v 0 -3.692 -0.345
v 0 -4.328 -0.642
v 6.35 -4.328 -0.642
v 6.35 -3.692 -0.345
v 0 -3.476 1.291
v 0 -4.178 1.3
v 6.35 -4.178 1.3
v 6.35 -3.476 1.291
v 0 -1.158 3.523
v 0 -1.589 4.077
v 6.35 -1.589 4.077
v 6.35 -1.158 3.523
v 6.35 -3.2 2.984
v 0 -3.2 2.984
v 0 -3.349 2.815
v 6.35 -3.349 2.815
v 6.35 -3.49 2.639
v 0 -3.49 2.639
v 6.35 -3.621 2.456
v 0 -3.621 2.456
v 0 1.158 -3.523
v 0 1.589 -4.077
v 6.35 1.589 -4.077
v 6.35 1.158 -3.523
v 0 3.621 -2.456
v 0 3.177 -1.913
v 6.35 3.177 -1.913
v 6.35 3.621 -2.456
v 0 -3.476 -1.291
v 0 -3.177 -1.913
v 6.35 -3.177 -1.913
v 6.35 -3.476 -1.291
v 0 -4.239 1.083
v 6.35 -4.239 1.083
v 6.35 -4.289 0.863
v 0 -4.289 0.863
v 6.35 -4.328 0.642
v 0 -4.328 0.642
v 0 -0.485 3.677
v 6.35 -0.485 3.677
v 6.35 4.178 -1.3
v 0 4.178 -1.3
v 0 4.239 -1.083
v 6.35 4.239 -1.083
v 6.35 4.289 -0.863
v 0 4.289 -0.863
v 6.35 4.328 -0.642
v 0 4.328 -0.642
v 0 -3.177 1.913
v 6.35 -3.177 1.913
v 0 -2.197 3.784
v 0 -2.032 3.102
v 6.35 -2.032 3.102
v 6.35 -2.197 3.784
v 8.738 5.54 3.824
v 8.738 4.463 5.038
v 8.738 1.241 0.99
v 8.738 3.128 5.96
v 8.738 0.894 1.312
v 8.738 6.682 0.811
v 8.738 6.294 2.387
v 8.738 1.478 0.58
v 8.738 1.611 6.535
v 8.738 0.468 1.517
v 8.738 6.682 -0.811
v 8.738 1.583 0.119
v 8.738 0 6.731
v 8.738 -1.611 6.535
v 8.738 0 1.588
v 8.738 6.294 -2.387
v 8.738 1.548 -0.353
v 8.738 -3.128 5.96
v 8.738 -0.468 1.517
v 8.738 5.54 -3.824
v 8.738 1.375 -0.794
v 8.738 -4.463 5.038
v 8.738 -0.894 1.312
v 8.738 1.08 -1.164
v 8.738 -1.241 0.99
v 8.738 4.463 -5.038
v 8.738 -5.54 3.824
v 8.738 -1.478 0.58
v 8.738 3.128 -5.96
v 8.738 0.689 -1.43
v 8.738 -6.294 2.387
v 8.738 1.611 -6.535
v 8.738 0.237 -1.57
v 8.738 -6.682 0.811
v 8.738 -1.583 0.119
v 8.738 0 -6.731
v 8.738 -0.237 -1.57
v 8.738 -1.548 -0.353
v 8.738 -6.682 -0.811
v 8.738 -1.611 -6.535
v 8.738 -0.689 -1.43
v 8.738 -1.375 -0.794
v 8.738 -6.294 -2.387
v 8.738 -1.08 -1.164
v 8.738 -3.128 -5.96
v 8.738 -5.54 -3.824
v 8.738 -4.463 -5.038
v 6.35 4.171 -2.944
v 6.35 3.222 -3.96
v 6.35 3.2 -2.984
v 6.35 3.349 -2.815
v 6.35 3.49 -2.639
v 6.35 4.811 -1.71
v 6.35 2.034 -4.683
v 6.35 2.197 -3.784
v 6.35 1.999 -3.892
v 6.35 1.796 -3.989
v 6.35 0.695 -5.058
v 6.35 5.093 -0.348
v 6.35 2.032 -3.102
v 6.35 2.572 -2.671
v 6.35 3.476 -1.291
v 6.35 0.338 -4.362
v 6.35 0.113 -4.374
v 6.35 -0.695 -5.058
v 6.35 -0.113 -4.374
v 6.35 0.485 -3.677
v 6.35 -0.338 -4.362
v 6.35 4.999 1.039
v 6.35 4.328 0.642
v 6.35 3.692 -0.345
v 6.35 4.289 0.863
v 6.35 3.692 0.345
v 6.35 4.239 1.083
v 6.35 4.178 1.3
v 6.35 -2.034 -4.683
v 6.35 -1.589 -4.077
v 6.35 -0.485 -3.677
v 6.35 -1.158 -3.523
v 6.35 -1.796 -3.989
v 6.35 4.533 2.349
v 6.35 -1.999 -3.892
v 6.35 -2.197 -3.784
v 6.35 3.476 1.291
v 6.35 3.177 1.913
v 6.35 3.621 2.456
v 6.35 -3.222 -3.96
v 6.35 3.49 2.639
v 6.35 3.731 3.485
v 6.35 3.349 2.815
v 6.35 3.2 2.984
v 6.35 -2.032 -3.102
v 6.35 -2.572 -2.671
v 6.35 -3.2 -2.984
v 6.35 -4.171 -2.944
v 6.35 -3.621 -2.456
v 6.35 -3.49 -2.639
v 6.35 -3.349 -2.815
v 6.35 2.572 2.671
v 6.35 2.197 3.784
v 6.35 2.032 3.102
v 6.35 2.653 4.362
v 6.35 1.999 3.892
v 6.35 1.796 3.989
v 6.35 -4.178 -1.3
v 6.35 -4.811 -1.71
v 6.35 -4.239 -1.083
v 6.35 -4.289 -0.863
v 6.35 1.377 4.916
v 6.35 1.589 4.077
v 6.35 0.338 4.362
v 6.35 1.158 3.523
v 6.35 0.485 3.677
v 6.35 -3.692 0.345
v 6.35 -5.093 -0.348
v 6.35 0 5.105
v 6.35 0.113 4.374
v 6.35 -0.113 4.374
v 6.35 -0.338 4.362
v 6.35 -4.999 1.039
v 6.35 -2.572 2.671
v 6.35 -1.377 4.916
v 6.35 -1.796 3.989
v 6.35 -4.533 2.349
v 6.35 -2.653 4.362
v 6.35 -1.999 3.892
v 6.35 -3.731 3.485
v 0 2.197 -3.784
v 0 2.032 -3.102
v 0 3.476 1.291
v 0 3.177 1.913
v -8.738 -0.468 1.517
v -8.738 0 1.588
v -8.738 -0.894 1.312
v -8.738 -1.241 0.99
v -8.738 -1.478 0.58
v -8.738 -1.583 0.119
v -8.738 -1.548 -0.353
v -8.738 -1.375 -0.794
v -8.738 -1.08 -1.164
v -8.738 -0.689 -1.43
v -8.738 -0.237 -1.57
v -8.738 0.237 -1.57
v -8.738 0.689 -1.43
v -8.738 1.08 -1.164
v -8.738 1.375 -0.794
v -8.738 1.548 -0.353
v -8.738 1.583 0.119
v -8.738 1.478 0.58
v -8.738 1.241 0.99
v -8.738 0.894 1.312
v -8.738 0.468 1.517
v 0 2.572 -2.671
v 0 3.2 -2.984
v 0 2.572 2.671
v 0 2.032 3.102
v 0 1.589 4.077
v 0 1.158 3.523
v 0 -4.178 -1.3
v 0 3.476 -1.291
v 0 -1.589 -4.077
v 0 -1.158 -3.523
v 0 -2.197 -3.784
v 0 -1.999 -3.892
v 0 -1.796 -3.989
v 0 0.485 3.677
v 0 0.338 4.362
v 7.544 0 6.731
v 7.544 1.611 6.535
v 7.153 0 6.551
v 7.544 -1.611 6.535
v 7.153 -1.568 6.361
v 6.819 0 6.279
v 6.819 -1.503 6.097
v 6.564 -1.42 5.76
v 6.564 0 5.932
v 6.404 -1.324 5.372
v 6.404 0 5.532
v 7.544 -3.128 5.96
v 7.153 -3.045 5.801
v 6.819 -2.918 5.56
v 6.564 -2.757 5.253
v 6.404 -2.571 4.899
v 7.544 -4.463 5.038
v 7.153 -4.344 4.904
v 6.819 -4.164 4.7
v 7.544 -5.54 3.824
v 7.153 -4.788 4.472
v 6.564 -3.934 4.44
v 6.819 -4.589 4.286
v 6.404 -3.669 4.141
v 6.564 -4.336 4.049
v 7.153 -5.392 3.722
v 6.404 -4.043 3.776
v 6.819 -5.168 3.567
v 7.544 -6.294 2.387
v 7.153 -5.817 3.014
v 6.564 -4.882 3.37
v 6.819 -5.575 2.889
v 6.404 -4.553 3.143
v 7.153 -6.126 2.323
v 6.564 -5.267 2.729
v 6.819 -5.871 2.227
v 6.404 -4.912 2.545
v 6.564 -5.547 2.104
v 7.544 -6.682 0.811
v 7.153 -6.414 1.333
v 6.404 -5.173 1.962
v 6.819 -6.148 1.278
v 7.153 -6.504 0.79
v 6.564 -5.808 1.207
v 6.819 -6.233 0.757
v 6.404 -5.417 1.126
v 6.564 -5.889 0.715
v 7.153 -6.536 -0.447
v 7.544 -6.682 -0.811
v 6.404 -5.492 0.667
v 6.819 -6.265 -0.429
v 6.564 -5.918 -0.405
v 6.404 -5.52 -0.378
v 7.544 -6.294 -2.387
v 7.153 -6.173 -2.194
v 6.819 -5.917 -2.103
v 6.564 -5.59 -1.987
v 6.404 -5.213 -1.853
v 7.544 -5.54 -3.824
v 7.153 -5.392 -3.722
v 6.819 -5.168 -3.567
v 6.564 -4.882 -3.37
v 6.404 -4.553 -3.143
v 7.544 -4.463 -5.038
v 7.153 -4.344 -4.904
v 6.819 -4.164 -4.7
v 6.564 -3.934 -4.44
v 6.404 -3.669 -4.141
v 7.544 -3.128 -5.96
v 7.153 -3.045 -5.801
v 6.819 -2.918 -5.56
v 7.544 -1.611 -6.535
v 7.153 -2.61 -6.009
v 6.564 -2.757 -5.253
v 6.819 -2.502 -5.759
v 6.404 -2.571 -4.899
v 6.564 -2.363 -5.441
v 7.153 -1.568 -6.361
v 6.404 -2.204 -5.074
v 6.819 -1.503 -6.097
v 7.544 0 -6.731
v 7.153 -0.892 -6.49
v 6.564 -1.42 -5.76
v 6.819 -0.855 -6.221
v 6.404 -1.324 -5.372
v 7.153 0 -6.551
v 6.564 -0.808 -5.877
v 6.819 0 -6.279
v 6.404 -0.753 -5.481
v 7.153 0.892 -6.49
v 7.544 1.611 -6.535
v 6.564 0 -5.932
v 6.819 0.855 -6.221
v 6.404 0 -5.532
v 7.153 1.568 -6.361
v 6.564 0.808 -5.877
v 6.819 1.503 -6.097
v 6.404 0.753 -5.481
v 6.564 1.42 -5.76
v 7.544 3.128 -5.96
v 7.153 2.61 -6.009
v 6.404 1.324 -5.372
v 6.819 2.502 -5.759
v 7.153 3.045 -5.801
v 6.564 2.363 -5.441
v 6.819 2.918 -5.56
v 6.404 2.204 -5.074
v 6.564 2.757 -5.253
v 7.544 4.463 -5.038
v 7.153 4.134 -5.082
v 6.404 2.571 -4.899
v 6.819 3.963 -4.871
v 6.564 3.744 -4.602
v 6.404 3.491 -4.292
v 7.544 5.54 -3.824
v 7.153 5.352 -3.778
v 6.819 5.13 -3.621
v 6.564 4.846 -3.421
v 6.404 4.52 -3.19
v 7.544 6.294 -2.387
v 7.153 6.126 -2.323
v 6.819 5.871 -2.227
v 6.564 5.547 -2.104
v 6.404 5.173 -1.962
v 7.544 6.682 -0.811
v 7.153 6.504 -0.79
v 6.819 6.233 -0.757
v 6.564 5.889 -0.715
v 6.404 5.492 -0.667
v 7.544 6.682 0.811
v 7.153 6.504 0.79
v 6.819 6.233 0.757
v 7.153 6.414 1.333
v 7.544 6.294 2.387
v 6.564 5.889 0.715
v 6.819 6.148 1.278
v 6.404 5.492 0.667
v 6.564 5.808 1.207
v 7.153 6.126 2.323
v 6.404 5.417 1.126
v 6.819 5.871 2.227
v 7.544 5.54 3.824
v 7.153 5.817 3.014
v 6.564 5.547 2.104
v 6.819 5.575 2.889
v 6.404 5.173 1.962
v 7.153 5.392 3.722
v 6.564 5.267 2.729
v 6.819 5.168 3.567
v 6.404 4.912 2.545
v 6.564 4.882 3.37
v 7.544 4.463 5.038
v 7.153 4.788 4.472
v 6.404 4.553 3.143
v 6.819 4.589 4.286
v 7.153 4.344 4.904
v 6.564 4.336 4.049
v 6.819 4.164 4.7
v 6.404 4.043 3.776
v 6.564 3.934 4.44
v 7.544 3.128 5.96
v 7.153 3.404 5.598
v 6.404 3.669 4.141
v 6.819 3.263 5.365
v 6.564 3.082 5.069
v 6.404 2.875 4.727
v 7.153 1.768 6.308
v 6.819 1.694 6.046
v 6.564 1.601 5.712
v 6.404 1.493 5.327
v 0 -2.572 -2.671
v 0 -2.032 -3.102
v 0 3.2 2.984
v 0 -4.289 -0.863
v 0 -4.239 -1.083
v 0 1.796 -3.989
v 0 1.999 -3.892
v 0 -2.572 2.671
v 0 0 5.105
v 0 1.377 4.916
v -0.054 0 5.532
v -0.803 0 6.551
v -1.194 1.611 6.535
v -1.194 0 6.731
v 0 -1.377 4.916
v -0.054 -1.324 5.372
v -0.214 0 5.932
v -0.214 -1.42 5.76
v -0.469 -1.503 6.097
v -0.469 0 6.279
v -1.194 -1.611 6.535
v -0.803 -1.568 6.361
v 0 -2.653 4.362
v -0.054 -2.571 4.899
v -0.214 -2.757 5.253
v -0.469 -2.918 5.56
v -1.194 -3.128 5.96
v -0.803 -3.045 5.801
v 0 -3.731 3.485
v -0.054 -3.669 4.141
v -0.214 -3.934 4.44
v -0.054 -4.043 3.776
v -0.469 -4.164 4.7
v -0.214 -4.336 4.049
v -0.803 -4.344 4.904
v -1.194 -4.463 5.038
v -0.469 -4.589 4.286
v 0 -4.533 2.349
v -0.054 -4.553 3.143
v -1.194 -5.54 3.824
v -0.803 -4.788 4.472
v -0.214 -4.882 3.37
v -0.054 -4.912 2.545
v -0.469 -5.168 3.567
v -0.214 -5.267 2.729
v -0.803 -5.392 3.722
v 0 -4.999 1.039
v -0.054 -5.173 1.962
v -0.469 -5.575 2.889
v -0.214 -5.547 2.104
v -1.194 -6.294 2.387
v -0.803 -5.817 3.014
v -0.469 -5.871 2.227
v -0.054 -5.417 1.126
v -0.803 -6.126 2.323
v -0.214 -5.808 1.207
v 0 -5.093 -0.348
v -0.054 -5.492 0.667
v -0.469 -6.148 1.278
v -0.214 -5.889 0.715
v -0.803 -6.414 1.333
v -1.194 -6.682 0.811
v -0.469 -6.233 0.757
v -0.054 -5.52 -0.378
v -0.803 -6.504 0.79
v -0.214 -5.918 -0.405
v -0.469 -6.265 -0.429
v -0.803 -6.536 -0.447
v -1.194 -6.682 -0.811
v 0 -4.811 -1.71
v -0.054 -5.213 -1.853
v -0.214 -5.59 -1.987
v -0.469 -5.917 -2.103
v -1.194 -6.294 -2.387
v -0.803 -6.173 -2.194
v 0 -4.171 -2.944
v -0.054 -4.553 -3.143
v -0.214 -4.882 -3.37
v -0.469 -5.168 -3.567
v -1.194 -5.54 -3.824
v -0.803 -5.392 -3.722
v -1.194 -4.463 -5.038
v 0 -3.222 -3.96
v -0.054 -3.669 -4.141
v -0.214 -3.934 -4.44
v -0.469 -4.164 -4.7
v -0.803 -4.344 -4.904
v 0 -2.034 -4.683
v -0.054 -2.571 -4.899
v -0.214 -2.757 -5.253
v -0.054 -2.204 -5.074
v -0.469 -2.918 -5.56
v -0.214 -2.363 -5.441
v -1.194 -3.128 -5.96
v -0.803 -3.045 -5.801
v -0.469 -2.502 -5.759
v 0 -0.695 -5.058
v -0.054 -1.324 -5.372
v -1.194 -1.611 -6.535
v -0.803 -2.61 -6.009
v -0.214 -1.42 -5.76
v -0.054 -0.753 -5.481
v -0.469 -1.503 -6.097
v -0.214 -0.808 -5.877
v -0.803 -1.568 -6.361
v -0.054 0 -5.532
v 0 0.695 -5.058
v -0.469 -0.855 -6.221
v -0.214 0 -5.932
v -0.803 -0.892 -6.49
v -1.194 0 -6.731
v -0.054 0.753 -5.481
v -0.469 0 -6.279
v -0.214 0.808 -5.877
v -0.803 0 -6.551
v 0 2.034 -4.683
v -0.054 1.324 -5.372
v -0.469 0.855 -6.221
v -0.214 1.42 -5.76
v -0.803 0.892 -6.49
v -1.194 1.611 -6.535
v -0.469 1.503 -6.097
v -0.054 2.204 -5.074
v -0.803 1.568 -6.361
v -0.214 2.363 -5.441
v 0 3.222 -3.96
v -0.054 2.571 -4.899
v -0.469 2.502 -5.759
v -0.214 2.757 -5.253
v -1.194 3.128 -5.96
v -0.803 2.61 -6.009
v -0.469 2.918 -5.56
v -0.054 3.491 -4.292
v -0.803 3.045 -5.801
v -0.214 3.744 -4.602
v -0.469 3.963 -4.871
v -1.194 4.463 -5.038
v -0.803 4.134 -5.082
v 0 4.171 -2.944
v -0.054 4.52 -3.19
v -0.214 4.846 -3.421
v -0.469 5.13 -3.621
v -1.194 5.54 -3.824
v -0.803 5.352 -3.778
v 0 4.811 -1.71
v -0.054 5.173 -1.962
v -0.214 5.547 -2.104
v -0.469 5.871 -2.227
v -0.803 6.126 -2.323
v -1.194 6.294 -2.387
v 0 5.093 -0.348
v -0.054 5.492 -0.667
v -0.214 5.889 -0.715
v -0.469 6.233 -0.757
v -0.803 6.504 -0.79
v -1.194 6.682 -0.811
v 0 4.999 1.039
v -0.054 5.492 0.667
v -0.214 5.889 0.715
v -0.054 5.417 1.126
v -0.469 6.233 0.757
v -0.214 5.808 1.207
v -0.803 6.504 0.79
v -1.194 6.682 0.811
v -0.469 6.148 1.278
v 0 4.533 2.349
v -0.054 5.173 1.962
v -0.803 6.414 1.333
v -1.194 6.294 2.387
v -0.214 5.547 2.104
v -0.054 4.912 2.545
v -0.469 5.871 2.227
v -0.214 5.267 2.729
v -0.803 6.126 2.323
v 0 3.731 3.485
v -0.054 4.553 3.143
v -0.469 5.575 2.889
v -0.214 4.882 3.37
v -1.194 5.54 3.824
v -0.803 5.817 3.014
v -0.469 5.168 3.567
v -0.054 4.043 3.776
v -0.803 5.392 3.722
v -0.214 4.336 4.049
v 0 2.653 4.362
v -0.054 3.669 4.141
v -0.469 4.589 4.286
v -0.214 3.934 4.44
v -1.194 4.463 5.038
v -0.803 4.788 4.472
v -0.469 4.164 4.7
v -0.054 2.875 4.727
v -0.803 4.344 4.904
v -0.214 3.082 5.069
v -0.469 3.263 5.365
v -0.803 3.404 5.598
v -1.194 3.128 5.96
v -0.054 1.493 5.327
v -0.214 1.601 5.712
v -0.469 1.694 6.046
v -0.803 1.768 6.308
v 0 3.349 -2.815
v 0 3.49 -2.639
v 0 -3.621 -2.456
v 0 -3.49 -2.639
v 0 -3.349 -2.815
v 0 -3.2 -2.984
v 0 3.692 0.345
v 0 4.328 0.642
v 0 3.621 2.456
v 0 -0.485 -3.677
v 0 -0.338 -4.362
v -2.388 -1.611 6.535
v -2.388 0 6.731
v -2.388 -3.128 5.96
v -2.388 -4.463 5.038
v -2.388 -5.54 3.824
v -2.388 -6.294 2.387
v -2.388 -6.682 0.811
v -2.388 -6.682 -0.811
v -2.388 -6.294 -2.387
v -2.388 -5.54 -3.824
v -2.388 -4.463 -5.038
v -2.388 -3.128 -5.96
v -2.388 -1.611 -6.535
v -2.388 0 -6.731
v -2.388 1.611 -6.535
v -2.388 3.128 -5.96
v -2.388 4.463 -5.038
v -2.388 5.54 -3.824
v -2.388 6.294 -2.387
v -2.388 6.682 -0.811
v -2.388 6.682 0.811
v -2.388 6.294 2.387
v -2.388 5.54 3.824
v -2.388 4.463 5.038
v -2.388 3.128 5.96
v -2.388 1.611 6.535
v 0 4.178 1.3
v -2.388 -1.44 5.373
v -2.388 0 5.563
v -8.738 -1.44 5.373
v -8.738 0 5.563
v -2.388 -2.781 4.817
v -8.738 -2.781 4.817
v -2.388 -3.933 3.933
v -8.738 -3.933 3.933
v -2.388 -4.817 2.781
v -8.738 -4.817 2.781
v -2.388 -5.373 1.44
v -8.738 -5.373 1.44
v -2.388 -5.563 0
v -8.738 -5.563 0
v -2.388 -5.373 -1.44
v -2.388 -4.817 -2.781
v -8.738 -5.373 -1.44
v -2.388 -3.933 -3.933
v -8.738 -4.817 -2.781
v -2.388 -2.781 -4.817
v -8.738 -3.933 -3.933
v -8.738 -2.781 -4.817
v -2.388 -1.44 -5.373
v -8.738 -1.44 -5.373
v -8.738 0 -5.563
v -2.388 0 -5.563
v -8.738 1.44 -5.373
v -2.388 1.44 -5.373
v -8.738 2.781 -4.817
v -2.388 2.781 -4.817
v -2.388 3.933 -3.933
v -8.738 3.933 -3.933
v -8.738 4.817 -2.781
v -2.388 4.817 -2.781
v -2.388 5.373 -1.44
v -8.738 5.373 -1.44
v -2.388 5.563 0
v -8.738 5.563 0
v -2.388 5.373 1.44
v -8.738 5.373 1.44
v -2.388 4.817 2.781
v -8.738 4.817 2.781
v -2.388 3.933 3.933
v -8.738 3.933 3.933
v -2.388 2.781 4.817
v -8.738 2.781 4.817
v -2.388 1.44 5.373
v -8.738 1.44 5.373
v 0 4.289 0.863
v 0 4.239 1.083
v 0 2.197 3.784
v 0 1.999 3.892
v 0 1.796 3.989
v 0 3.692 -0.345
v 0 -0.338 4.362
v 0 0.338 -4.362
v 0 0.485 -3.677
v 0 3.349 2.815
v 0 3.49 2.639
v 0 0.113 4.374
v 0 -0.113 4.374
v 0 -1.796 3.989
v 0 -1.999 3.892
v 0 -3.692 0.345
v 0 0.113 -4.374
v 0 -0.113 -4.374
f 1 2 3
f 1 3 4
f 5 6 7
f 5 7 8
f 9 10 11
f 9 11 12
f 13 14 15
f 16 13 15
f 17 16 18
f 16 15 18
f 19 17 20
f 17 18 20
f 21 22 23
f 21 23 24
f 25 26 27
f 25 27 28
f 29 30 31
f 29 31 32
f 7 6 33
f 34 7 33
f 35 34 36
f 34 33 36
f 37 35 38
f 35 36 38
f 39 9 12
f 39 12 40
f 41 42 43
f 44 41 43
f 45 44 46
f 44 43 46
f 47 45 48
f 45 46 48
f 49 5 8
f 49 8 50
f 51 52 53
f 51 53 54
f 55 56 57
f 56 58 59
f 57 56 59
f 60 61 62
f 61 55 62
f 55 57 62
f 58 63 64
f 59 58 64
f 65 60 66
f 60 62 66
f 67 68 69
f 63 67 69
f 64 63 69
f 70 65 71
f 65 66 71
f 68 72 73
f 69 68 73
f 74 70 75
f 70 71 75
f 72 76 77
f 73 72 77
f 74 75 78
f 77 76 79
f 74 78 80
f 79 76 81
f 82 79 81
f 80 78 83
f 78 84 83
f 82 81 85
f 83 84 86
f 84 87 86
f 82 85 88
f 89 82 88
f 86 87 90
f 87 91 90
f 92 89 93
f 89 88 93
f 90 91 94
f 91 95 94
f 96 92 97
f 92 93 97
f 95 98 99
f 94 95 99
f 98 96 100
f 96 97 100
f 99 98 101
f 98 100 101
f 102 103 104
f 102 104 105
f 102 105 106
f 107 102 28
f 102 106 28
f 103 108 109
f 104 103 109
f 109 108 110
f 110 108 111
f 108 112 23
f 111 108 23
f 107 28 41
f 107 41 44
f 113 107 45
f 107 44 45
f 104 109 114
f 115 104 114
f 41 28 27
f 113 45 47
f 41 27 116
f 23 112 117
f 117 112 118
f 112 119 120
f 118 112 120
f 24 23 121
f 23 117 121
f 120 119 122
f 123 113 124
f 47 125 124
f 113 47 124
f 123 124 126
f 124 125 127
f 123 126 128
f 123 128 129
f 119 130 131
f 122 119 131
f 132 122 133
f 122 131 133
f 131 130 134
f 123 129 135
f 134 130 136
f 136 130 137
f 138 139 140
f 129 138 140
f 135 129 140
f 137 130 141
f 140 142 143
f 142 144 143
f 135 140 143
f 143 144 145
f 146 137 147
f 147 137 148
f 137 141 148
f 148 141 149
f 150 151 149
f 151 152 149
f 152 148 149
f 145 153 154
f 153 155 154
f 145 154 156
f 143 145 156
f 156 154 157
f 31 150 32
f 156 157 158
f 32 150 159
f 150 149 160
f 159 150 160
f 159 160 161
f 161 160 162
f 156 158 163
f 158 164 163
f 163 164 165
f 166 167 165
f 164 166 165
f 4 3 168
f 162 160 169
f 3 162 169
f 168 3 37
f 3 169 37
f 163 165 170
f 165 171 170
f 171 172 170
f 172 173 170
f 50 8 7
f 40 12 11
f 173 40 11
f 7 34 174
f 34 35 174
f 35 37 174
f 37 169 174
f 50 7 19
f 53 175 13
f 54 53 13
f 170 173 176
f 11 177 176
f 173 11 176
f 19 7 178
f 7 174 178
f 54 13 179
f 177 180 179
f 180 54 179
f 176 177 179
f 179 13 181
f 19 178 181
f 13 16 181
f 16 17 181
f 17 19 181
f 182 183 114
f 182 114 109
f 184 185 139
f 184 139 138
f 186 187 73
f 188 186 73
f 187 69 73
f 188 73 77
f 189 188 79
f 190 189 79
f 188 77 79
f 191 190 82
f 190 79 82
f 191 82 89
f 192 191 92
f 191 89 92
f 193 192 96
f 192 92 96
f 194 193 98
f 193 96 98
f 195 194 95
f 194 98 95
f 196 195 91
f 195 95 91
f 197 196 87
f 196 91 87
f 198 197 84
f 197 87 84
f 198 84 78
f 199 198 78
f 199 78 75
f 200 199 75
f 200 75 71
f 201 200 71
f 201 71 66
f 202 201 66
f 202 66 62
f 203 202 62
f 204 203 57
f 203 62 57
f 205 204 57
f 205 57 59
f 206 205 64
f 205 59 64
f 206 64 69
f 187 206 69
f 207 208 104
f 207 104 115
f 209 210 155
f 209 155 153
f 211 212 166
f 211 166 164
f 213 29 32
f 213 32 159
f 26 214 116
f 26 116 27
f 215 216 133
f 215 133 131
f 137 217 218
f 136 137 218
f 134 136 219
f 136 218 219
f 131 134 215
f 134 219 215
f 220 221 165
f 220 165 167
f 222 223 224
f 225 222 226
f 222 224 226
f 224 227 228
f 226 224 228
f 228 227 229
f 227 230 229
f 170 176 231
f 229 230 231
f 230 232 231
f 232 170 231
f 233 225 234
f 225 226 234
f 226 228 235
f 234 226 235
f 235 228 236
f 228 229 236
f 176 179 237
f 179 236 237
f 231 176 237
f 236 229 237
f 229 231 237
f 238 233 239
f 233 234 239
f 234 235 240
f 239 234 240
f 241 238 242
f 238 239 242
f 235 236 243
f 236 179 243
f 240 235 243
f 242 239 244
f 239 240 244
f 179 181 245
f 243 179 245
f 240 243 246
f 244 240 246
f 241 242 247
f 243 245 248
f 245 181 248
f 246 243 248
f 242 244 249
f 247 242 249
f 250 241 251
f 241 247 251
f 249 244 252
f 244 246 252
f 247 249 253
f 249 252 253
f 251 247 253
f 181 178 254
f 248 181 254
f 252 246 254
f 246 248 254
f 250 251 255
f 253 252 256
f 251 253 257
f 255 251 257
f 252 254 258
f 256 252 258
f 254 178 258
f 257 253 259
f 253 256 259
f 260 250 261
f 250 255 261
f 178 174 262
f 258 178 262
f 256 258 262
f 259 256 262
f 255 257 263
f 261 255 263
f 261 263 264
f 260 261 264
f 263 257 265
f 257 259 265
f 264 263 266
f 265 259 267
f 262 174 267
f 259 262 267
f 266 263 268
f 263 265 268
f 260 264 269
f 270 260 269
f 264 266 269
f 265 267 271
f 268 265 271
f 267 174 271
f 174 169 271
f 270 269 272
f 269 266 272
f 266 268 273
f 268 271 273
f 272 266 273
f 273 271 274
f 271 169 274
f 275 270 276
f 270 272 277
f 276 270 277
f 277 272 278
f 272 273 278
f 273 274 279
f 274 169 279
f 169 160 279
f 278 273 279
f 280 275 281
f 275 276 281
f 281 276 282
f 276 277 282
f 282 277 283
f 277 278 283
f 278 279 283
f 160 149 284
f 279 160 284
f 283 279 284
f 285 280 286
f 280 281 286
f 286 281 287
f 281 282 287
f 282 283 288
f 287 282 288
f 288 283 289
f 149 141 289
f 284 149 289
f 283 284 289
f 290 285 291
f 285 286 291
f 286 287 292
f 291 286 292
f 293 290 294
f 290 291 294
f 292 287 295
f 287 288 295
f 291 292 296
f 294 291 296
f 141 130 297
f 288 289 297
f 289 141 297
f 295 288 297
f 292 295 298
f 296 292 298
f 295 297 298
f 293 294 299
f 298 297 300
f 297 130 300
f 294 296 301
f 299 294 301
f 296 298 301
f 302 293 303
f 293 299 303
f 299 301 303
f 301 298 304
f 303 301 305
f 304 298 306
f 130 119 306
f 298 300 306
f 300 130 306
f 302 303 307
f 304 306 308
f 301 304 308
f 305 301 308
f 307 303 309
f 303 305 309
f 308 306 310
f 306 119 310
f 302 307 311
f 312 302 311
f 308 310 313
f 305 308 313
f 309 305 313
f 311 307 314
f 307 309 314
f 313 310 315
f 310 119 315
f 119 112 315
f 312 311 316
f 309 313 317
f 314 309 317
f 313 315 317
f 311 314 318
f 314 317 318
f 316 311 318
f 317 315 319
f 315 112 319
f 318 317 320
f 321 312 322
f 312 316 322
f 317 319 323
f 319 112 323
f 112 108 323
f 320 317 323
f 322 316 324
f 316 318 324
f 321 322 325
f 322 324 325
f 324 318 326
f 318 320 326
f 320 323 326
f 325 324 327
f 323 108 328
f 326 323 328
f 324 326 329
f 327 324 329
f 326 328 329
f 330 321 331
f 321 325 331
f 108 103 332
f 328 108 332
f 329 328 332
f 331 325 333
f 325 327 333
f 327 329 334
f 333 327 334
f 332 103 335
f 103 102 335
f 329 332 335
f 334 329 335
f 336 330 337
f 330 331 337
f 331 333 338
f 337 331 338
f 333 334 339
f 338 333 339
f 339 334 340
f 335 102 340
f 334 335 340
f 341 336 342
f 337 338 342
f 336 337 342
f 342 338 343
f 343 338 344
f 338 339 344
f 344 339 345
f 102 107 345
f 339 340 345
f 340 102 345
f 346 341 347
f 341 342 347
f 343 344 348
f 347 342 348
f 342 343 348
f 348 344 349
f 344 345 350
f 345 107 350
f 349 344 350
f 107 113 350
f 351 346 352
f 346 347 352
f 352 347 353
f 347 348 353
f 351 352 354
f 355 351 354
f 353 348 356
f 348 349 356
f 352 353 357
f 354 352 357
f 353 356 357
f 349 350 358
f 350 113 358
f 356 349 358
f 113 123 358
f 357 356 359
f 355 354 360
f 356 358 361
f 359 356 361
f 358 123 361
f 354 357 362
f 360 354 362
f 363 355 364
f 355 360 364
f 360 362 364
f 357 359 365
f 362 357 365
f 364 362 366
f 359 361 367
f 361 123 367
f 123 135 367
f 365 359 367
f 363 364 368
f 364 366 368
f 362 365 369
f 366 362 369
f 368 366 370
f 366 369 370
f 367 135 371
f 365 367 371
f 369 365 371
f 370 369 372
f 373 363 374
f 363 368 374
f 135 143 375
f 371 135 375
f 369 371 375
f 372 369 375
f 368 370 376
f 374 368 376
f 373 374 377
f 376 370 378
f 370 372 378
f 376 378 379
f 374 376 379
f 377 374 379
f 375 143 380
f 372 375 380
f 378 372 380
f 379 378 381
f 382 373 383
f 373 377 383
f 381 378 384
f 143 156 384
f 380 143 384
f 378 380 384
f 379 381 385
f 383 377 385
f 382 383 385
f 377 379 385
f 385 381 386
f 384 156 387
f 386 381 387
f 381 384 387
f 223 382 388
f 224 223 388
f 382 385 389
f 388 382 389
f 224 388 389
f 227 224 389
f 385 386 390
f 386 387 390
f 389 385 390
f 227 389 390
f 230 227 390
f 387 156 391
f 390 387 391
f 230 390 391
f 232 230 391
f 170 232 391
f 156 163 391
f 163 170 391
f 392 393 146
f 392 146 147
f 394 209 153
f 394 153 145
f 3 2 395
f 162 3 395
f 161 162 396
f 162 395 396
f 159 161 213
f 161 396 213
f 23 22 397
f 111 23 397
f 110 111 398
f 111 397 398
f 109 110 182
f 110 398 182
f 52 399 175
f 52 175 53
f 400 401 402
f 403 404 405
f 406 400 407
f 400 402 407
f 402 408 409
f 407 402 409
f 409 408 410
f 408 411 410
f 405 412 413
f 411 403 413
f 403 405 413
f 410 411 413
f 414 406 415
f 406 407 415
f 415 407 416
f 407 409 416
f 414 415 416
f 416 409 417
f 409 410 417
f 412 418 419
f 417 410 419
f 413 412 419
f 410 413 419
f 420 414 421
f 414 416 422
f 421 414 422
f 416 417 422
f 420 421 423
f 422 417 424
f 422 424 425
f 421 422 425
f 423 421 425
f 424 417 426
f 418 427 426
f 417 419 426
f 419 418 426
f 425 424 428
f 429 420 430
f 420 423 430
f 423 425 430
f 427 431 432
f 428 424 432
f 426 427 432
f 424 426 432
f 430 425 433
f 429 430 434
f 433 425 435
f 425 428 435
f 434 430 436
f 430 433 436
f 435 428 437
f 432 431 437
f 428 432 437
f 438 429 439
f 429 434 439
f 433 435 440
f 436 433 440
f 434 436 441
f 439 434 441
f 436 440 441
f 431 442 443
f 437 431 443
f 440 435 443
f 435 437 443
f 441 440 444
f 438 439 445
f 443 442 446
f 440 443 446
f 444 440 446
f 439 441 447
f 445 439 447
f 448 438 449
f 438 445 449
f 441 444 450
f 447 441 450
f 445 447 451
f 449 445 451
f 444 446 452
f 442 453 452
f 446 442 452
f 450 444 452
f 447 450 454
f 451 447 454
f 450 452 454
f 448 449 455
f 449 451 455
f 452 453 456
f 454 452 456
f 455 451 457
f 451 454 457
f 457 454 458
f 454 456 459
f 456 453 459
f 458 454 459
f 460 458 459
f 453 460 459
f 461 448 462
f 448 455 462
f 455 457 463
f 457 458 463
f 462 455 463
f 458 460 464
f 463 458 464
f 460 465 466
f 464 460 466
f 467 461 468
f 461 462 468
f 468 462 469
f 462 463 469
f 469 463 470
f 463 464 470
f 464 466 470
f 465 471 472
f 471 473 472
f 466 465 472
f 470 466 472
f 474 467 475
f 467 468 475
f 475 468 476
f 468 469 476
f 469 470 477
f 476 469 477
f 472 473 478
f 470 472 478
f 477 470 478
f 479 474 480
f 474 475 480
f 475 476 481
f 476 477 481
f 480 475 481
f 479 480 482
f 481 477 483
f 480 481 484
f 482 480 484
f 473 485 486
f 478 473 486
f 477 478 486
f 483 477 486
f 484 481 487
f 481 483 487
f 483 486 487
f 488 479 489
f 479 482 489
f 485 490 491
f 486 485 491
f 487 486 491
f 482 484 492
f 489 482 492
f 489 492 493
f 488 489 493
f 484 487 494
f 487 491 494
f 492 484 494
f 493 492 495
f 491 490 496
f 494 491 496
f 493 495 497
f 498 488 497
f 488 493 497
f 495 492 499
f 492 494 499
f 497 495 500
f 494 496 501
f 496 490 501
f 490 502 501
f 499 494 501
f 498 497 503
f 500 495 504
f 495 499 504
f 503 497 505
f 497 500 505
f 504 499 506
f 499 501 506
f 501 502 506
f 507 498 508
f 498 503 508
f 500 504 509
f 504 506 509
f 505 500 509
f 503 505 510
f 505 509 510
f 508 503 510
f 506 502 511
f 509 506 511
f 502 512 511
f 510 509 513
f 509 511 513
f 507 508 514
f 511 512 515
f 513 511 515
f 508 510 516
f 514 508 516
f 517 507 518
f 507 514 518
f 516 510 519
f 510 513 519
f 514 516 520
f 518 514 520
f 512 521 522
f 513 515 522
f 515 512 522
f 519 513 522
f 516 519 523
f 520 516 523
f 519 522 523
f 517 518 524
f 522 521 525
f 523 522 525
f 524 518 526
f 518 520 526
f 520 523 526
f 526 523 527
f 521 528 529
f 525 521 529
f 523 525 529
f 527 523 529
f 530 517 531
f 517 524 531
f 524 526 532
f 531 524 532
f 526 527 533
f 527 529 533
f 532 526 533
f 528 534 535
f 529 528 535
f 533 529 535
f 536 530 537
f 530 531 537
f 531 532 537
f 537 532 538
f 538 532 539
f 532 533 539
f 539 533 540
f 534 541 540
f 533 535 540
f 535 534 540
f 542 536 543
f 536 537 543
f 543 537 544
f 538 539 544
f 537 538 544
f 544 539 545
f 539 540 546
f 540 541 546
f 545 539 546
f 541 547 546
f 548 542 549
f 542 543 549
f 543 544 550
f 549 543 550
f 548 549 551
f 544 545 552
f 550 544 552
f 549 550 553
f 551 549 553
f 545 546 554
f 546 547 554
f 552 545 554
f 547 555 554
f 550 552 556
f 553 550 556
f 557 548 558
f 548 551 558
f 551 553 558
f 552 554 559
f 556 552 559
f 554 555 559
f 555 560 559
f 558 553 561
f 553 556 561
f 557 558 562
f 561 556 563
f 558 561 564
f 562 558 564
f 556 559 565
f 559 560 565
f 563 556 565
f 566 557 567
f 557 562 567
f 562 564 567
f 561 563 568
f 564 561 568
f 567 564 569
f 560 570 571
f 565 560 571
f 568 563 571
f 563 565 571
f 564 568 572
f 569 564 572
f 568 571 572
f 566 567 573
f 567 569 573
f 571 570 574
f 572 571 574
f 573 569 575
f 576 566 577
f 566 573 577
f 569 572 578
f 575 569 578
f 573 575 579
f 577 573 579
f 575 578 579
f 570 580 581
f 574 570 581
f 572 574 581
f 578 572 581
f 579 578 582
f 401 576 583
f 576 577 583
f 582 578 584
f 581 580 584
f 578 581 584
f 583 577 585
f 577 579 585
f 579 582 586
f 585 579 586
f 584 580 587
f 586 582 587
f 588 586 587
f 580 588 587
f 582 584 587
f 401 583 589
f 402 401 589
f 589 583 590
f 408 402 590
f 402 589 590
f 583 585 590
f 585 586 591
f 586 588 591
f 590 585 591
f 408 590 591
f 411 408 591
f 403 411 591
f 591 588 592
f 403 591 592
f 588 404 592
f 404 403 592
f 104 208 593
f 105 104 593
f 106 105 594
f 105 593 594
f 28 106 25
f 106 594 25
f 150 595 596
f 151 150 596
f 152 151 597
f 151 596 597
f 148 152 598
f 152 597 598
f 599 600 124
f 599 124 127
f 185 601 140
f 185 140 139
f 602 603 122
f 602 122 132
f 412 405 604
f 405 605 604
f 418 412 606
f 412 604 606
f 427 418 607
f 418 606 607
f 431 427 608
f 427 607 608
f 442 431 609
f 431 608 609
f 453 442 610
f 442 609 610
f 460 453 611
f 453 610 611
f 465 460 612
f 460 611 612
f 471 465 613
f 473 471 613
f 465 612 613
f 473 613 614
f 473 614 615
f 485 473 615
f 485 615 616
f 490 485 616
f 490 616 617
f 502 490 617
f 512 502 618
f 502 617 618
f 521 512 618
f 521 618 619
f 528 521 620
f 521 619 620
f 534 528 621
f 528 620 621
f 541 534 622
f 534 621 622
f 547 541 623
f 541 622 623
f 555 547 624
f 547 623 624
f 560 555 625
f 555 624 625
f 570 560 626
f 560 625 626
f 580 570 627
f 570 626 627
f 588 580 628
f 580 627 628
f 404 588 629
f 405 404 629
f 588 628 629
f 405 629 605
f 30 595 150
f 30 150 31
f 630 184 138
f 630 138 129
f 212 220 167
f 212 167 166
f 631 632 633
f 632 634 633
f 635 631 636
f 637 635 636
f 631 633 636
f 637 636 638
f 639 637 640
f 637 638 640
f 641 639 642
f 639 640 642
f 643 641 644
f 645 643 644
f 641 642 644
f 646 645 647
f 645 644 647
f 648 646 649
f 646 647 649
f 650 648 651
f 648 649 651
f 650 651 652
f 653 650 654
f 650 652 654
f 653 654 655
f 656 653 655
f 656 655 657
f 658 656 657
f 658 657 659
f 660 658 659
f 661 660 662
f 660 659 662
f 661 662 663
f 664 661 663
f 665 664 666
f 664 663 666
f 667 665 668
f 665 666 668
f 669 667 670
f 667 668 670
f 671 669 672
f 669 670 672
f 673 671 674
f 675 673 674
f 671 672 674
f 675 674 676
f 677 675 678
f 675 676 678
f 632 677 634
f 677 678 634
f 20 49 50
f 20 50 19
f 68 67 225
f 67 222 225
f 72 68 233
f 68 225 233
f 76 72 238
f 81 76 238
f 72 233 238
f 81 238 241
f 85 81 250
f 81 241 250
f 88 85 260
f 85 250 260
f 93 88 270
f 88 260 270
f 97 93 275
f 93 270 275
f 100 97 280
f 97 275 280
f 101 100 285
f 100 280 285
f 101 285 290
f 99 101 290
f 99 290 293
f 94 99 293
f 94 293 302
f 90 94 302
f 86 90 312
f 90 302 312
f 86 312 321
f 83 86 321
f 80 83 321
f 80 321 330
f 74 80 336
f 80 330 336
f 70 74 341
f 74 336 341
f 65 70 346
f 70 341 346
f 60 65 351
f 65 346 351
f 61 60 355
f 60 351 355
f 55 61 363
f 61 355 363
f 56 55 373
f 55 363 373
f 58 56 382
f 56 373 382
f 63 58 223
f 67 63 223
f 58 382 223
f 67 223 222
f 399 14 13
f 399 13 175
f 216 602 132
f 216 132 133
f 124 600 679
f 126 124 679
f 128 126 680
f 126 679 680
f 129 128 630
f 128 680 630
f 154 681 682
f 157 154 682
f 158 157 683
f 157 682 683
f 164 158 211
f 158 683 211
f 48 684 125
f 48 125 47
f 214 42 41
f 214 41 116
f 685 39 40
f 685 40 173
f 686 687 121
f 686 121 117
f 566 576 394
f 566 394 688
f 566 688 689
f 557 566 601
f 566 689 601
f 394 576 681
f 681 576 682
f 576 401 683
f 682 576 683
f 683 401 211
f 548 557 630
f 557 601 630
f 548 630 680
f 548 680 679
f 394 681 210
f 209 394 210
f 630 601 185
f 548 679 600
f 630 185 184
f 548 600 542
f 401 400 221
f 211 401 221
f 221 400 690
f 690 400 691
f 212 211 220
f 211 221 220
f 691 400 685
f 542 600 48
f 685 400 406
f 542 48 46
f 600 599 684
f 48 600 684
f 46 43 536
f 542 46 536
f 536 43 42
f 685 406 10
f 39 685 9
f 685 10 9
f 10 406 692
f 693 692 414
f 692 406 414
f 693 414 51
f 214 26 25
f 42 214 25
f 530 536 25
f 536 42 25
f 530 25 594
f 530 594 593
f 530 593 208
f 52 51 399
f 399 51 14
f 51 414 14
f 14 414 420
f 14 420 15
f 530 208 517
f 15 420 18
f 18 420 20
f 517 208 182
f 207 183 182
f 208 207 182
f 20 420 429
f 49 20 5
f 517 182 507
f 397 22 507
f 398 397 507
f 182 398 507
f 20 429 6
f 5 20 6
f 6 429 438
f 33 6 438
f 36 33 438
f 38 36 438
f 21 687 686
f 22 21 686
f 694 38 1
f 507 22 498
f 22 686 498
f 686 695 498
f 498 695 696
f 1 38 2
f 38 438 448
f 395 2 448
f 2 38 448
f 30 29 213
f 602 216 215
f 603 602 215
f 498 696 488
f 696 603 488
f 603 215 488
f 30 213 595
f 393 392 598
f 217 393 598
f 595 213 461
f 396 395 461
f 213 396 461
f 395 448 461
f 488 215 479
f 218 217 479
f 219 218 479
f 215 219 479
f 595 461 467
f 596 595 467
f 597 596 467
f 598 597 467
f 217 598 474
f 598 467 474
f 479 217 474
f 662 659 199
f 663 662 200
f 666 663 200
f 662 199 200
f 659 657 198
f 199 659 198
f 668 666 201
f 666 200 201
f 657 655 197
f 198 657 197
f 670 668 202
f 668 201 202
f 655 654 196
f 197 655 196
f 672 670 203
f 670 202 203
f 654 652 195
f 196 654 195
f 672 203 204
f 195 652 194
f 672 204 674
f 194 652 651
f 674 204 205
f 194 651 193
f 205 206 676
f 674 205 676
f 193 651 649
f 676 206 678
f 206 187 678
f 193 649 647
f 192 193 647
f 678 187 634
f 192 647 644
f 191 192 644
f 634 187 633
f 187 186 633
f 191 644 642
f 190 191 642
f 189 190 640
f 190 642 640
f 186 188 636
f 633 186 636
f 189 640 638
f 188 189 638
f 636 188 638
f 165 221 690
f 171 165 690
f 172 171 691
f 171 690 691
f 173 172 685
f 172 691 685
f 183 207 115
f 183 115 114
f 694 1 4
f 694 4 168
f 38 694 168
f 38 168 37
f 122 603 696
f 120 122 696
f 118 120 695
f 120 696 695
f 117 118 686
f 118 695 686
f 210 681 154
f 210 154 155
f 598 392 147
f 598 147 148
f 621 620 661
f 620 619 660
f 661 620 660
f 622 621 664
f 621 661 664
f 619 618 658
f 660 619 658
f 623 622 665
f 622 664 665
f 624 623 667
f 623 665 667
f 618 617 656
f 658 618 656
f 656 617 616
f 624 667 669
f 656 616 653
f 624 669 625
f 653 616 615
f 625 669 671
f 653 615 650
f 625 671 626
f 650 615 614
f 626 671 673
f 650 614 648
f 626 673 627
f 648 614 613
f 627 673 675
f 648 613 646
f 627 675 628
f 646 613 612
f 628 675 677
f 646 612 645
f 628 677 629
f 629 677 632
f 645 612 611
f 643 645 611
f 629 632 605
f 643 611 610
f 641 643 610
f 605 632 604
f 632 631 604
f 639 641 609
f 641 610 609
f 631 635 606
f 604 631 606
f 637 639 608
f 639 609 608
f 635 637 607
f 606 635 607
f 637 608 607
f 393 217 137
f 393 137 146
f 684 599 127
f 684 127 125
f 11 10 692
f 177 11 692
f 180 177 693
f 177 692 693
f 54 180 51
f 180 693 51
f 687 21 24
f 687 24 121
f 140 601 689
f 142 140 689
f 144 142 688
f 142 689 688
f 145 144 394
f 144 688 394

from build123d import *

# Parameters (mm, degrees)
SKETCH4_R          = 4.5339
SKETCH4_R_2        = 4.37515
CUT_EXTRUDE2_DEPTH = 6.35
CUT_EXTRUDE1_DEPTH = 6.35
CIRPATTERN1_COUNT  = 14


with BuildPart() as part:
    # Sketch1 → Revolve1 (revolve)
    with BuildSketch(Plane.XY, mode=Mode.PRIVATE) as revolve1_sk:
        with BuildLine():
            Line((-8.7376, 1.5875), (8.7376, 1.5875))
            Line((8.7376, 1.5875), (8.7376, 6.731))
            Line((8.7376, 6.731), (7.5438, 6.731))
            ThreePointArc((7.5438, 6.731), (6.680508602, 6.113831183), (6.35, 5.1054))
            Line((6.35, 5.1054), (6.35, 4.5339))
            Line((6.35, 4.5339), (0, 4.5339))
            Line((0, 4.5339), (0, 5.1054))
            ThreePointArc((0, 5.1054), (-0.330508602, 6.113831183), (-1.1938, 6.731))
            Line((-1.1938, 6.731), (-2.3876, 6.731))
            Line((-2.3876, 6.731), (-2.3876, 5.5626))
            Line((-2.3876, 5.5626), (-8.7376, 5.5626))
            Line((-8.7376, 5.5626), (-8.7376, 1.5875))
        make_face()
    revolve(revolve1_sk.sketch.rotate(Axis((-8.7376, 0, 0), (1, 0, 0)), 90), axis=Axis((-8.7376, 0, 0), (1, 0, 0)))

    # Sketch4 → Cut-Extrude2 (cut)
    with BuildSketch(Plane(origin=(0, 0, 0), x_dir=(0, 0, -1), z_dir=(1, 0, 0))):
        Circle(SKETCH4_R)
        Circle(SKETCH4_R_2, mode=Mode.SUBTRACT)
    extrude(amount=CUT_EXTRUDE2_DEPTH, mode=Mode.SUBTRACT)

    # Sketch3 → Cut-Extrude1 (cut)
    with BuildSketch(Plane(origin=(0, 0, 0), x_dir=(0, 0, -1), z_dir=(1, 0, 0))):
        with BuildLine():
            Line((-0.641613493, 4.327848154), (-0.345249615, 3.692293767))
            Line((-0.345249615, 3.692293767), (0.345249615, 3.692293767))
            Line((0.345249615, 3.692293767), (0.641613493, 4.327848154))
            ThreePointArc((0.641613493, 4.327848154), (0, 4.37515), (-0.641613493, 4.327848154))
        make_face()
    cut_extrude1 = extrude(amount=CUT_EXTRUDE1_DEPTH, mode=Mode.SUBTRACT)

    # CirPattern1: Cut-Extrude1 ×14 about axis
    cirpattern1_axis = Axis((0, 0, 0), (1, 0, 0))
    for i in range(1, CIRPATTERN1_COUNT):
        add(cut_extrude1.rotate(cirpattern1_axis, i * 360 / CIRPATTERN1_COUNT), mode=Mode.SUBTRACT)


solid = part.part
